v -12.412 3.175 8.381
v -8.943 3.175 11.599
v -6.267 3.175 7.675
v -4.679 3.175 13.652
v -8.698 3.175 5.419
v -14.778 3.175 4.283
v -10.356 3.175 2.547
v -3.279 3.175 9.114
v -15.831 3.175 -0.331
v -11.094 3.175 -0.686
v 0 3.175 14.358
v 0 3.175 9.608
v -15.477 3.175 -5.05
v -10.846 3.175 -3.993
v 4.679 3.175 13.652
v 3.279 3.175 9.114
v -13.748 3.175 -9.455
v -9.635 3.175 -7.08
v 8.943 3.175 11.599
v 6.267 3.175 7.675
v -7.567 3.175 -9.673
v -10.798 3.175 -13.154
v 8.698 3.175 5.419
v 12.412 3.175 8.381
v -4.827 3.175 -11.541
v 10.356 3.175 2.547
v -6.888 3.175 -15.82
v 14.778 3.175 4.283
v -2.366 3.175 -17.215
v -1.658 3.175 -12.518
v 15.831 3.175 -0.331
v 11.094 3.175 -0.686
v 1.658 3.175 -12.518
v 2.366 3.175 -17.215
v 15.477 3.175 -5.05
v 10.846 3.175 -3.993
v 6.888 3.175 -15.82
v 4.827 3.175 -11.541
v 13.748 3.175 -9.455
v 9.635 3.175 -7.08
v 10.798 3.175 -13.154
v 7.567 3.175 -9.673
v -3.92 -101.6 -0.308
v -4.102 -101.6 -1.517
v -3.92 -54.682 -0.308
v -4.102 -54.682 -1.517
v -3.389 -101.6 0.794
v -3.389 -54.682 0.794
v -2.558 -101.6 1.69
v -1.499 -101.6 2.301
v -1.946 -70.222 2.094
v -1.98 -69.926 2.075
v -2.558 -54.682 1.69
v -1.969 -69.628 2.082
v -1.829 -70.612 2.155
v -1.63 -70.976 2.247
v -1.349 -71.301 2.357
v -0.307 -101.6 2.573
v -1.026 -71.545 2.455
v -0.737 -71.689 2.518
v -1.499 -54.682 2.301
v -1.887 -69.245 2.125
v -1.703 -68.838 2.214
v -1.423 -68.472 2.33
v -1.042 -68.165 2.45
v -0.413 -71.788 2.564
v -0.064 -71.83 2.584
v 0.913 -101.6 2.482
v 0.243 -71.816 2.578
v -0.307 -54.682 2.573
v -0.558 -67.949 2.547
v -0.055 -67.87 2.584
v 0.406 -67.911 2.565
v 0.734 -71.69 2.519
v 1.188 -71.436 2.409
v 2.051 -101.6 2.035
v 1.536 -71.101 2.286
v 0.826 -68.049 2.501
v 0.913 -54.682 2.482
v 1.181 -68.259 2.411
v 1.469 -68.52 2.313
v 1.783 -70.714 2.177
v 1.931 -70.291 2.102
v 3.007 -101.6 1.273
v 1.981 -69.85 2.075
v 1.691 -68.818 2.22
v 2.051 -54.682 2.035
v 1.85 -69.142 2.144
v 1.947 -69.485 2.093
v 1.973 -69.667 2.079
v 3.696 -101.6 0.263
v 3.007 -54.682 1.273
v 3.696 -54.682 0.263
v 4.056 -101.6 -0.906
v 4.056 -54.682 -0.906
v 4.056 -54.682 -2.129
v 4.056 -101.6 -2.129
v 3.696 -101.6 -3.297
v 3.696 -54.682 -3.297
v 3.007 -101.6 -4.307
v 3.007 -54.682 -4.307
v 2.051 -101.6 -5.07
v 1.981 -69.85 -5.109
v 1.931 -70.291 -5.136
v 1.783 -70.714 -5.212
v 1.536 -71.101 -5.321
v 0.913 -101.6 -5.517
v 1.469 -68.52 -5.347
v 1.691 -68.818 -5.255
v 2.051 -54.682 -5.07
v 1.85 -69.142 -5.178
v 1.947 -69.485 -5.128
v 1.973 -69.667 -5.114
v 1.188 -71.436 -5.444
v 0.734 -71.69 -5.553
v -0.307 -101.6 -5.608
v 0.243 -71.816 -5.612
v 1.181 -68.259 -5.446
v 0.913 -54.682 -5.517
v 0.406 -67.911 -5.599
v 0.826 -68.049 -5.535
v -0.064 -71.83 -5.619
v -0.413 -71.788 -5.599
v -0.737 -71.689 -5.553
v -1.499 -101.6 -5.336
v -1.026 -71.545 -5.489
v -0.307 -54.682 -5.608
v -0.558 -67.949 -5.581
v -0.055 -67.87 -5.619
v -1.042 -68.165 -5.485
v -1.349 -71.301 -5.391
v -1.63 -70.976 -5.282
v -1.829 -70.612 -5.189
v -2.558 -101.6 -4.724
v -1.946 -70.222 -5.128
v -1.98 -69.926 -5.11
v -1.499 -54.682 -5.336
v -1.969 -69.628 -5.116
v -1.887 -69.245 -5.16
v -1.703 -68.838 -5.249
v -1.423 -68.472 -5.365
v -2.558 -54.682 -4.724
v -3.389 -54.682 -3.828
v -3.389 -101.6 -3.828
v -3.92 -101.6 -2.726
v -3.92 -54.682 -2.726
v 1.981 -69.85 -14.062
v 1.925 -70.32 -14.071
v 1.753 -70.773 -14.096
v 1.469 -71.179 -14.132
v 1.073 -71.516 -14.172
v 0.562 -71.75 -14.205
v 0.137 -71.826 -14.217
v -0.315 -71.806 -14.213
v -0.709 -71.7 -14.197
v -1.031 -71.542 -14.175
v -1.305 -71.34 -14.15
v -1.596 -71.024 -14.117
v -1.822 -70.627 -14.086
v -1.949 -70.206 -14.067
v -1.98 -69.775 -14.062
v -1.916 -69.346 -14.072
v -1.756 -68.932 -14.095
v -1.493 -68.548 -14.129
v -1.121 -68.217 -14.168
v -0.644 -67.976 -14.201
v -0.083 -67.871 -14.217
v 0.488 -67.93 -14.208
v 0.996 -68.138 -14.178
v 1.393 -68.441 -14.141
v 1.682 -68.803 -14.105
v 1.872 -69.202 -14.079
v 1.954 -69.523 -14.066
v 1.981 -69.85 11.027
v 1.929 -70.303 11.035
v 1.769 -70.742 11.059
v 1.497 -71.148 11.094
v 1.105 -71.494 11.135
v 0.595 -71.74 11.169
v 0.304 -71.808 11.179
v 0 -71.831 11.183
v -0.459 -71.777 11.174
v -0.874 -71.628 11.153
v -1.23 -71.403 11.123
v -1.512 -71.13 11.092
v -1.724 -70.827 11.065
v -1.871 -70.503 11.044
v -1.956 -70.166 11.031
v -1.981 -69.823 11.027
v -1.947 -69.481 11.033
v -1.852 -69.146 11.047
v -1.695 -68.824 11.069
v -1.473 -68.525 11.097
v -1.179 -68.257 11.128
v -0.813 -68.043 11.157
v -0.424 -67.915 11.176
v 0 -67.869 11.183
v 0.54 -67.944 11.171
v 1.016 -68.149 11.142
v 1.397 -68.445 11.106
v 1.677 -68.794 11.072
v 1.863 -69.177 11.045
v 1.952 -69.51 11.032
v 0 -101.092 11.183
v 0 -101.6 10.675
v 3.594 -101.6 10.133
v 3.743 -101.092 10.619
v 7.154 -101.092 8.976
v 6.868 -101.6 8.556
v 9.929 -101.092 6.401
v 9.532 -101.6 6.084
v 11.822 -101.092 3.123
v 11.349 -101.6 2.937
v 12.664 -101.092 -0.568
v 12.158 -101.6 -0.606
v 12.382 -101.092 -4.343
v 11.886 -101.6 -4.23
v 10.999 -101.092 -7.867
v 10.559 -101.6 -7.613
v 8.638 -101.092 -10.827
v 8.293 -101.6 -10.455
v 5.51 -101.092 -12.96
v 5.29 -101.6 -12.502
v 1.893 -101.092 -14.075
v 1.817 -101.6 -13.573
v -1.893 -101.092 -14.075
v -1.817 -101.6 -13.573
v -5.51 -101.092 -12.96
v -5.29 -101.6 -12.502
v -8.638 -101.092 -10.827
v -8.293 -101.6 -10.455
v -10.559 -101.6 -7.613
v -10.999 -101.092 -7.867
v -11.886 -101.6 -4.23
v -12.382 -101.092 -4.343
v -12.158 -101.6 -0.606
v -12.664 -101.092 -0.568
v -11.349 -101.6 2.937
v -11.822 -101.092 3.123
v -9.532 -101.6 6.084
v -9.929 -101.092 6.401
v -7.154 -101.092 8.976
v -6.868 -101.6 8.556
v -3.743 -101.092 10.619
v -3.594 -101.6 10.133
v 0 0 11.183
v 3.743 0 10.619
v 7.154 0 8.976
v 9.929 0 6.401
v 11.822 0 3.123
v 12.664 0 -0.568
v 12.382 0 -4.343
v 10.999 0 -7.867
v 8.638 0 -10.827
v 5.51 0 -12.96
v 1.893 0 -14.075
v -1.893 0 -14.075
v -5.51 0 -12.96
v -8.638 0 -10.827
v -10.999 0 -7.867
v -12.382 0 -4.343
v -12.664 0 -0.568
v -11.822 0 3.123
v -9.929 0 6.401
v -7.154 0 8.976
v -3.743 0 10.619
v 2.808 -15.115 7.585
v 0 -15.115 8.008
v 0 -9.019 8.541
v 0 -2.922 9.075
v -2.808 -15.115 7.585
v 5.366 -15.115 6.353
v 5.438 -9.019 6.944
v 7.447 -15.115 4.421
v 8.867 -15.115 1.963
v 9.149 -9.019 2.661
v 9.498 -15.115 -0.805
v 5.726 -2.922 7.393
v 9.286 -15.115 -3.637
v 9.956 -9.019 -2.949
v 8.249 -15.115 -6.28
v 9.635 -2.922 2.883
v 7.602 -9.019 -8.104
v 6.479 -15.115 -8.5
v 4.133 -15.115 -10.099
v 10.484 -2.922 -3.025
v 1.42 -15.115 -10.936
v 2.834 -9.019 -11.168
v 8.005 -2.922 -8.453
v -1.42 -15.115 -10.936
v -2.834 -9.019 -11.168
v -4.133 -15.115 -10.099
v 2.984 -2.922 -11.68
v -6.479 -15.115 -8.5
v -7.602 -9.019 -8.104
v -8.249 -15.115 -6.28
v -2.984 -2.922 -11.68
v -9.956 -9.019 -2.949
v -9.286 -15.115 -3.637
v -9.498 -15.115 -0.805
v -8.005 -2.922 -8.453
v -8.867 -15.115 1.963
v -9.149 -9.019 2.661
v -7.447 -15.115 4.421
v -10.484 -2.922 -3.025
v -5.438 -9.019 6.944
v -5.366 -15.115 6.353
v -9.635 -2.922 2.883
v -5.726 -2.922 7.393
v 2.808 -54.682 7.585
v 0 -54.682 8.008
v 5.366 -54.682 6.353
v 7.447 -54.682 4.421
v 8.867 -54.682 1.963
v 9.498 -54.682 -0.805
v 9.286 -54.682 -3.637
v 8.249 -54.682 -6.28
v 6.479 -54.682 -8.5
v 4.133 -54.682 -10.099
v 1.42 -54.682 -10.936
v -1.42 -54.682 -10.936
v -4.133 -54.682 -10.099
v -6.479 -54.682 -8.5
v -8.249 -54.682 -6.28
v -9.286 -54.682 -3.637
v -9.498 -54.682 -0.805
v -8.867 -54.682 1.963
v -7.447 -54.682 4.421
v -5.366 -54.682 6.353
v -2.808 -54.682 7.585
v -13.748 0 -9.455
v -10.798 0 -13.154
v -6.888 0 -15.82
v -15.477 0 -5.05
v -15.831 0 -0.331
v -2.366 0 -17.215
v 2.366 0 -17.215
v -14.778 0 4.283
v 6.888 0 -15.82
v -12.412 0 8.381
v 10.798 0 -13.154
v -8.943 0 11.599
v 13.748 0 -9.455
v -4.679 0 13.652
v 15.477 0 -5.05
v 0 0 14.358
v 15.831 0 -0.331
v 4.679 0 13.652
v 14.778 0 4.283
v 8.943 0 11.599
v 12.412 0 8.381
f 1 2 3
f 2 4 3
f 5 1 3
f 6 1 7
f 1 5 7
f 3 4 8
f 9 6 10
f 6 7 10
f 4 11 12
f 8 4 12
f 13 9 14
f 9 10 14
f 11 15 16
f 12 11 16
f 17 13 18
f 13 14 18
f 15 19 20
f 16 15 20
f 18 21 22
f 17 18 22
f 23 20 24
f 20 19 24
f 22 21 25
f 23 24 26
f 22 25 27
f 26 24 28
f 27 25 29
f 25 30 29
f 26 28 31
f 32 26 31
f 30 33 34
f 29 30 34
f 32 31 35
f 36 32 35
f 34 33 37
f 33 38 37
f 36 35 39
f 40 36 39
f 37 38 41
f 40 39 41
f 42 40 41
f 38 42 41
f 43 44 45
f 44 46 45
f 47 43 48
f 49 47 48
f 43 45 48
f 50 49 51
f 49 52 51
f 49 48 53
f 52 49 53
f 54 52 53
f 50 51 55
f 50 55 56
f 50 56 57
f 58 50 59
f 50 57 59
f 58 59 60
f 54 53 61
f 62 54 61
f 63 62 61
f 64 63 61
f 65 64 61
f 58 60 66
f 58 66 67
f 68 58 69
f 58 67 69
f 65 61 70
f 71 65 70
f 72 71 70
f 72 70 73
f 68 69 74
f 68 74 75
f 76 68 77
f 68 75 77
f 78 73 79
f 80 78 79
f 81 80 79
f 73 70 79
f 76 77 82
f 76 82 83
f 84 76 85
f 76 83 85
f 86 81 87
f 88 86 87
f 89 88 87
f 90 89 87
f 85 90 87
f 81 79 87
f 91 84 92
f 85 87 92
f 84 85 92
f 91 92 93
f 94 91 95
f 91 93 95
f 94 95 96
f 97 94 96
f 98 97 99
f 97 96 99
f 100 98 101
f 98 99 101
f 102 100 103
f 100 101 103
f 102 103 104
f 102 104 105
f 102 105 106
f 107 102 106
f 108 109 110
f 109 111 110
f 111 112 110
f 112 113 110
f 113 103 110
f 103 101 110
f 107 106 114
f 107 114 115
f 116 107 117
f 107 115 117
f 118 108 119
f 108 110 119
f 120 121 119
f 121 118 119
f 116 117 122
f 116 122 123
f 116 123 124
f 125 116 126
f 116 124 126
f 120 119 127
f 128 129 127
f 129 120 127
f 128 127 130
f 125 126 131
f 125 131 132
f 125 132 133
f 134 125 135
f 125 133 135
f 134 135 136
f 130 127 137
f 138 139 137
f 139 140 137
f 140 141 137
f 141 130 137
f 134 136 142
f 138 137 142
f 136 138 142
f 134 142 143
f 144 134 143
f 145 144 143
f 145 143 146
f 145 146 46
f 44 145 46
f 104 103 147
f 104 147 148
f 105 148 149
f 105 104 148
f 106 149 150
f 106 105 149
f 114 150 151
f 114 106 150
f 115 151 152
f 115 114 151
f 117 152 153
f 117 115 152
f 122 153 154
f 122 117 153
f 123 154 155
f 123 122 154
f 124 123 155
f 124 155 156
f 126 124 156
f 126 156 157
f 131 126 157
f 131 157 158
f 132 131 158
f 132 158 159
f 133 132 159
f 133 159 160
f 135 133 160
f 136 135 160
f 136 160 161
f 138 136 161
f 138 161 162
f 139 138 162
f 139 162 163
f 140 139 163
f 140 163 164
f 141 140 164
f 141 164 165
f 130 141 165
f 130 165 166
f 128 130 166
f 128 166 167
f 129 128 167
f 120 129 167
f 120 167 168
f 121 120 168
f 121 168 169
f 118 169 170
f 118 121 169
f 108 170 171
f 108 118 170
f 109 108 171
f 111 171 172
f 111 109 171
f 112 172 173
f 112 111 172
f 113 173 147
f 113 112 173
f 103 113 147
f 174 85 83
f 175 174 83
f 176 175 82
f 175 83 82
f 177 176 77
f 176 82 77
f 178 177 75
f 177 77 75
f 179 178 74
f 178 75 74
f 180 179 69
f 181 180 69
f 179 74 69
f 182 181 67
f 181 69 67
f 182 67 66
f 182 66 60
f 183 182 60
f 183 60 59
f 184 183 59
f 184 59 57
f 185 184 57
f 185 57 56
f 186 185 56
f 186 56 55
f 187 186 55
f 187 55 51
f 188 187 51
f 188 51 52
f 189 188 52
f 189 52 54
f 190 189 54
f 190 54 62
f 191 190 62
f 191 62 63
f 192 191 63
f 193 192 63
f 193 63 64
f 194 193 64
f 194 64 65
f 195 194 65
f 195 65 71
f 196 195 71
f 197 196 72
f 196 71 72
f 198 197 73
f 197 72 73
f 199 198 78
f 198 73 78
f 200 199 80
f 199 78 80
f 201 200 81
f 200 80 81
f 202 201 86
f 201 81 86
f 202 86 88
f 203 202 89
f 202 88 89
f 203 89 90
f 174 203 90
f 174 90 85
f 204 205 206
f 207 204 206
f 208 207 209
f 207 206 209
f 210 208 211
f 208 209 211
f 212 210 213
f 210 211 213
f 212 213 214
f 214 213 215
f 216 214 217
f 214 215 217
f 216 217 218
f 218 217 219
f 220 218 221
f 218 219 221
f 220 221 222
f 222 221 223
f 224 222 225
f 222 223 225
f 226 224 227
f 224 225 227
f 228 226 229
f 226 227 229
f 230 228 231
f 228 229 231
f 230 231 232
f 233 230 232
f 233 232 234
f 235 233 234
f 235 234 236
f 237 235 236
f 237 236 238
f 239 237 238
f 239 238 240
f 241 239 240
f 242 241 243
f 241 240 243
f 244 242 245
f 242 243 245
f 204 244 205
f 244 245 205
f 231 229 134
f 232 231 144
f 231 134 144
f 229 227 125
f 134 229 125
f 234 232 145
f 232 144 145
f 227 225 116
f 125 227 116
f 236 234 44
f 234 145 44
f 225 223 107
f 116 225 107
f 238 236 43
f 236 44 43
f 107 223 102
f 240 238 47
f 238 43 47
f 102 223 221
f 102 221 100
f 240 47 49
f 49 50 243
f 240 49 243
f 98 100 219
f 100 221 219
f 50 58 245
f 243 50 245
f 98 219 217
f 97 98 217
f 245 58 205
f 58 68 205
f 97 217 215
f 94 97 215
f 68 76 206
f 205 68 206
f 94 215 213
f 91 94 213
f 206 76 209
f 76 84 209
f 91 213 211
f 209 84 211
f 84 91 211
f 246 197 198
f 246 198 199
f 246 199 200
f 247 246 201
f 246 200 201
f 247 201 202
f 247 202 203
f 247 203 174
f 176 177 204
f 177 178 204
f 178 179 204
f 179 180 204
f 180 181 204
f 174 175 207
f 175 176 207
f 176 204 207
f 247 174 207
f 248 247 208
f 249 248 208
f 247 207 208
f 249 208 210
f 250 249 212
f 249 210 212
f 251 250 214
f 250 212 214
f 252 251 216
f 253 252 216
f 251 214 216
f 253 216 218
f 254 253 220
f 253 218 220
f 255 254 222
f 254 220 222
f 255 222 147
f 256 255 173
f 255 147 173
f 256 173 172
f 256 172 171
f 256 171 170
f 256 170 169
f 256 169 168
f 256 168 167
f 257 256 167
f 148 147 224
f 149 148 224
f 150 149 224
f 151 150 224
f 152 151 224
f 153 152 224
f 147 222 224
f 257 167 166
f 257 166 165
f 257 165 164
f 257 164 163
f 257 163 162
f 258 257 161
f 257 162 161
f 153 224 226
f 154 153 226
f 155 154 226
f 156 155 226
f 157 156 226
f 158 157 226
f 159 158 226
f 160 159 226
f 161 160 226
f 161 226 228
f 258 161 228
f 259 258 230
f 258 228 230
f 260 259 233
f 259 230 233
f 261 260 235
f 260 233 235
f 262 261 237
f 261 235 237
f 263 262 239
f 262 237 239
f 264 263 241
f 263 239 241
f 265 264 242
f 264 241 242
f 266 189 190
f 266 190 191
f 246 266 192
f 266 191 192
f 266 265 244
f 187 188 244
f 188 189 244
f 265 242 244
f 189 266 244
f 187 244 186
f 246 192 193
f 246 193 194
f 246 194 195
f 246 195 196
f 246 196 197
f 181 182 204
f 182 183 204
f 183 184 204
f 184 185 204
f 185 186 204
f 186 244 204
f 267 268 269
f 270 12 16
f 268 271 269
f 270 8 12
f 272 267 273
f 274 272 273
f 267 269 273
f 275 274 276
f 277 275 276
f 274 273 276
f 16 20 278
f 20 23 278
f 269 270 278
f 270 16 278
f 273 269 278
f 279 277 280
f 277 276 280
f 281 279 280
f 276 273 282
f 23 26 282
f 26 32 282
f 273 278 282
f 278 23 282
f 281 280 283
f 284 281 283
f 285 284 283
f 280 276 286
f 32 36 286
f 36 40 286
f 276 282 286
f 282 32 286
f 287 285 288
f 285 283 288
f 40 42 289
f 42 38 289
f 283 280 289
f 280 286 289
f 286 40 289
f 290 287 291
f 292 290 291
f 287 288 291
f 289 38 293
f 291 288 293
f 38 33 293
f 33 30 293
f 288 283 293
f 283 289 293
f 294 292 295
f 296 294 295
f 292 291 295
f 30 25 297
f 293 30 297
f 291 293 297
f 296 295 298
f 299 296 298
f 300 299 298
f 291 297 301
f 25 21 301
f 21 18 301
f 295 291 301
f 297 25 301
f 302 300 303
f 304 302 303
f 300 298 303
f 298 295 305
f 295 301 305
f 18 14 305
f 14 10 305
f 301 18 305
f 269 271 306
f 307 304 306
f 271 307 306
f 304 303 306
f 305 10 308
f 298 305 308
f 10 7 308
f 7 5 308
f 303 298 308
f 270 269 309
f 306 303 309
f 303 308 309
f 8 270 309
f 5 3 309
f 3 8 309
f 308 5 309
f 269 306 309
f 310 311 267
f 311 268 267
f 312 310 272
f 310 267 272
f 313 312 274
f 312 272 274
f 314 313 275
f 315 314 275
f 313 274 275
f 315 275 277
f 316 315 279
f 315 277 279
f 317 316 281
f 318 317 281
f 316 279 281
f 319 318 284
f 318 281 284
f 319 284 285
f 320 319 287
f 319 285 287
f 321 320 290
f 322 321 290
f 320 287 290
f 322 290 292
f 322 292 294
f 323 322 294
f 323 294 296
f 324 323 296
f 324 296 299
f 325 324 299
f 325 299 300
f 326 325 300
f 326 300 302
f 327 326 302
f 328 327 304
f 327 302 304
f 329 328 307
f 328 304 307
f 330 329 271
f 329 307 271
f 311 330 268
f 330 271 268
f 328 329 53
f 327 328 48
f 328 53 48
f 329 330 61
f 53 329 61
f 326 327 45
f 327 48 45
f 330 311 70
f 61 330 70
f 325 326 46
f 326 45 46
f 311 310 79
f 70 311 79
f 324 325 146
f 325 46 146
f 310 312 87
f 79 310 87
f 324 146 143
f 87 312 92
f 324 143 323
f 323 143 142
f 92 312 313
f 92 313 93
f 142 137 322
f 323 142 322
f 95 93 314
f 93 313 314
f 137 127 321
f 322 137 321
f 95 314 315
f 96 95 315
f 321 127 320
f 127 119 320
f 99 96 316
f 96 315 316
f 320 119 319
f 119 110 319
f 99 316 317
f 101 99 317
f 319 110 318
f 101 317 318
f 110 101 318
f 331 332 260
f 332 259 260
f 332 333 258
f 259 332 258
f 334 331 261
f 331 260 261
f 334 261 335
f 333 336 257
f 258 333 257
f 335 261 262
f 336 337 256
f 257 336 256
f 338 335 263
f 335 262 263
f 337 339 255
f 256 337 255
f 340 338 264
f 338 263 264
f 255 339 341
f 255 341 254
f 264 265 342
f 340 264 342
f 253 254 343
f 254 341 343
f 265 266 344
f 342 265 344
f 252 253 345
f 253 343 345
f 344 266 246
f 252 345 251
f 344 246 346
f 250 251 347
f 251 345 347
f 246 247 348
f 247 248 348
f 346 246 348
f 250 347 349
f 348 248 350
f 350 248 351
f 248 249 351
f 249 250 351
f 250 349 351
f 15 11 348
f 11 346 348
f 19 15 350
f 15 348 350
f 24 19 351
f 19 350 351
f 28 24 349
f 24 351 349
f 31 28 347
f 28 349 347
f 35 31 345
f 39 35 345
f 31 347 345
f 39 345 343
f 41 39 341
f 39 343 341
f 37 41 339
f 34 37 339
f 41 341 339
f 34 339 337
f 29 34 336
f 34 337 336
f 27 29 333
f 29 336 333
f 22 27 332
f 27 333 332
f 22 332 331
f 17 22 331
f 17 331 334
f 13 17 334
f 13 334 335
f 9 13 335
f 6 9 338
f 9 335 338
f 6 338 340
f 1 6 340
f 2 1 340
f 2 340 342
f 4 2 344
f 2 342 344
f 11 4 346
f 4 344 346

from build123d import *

# Parameters (mm, degrees)
F3_D          = 8.2042
F5_R          = 1.9812
F6_DEPTH      = 15.876
F6_DEPTH_BACK = 15.876
F7_SIZE       = 0.508


with BuildPart() as f1:
    # F0 (on Right) → F1 (revolve)
    with BuildSketch(Plane.YZ):
        Polygon((0, 11.1827357164), (-101.6, 11.1827357164), (-101.6, -1.5172642836), (-54.6817518771, -1.5172642836), (-54.6817518771, 8.0077357164), (-15.1153696949, 8.0077357164), (3.175, 9.6079357164), (3.175, 14.3577357164), (0, 14.3577357164), align=None)
    revolve(axis=Axis((0, -78.1408759385, -1.5172642836), (0, 1, 0)))

    # F3 (through all)
    with Locations(Plane.XZ.offset(101.6)):
        with Locations((0, -1.5172642836)):
            Hole(F3_D / 2)

    # F5 (on face) → F6 (cut, two sides)
    with BuildSketch(Plane(origin=(0, 0, -1.5172642836), x_dir=(1, 0, 0), z_dir=(0, 0, -1))) as f6_sk:
        with Locations((0, 69.85)):
            Circle(F5_R)
    extrude(amount=-F6_DEPTH, mode=Mode.SUBTRACT)
    extrude(f6_sk.sketch, amount=F6_DEPTH_BACK, mode=Mode.SUBTRACT)

    # F7
    f7_edges = [f1.edges().sort_by_distance(p)[0] for p in [
        (0, -101.6, -14.217264),
    ]]
    chamfer(f7_edges, length=F7_SIZE)


solid = f1.part
